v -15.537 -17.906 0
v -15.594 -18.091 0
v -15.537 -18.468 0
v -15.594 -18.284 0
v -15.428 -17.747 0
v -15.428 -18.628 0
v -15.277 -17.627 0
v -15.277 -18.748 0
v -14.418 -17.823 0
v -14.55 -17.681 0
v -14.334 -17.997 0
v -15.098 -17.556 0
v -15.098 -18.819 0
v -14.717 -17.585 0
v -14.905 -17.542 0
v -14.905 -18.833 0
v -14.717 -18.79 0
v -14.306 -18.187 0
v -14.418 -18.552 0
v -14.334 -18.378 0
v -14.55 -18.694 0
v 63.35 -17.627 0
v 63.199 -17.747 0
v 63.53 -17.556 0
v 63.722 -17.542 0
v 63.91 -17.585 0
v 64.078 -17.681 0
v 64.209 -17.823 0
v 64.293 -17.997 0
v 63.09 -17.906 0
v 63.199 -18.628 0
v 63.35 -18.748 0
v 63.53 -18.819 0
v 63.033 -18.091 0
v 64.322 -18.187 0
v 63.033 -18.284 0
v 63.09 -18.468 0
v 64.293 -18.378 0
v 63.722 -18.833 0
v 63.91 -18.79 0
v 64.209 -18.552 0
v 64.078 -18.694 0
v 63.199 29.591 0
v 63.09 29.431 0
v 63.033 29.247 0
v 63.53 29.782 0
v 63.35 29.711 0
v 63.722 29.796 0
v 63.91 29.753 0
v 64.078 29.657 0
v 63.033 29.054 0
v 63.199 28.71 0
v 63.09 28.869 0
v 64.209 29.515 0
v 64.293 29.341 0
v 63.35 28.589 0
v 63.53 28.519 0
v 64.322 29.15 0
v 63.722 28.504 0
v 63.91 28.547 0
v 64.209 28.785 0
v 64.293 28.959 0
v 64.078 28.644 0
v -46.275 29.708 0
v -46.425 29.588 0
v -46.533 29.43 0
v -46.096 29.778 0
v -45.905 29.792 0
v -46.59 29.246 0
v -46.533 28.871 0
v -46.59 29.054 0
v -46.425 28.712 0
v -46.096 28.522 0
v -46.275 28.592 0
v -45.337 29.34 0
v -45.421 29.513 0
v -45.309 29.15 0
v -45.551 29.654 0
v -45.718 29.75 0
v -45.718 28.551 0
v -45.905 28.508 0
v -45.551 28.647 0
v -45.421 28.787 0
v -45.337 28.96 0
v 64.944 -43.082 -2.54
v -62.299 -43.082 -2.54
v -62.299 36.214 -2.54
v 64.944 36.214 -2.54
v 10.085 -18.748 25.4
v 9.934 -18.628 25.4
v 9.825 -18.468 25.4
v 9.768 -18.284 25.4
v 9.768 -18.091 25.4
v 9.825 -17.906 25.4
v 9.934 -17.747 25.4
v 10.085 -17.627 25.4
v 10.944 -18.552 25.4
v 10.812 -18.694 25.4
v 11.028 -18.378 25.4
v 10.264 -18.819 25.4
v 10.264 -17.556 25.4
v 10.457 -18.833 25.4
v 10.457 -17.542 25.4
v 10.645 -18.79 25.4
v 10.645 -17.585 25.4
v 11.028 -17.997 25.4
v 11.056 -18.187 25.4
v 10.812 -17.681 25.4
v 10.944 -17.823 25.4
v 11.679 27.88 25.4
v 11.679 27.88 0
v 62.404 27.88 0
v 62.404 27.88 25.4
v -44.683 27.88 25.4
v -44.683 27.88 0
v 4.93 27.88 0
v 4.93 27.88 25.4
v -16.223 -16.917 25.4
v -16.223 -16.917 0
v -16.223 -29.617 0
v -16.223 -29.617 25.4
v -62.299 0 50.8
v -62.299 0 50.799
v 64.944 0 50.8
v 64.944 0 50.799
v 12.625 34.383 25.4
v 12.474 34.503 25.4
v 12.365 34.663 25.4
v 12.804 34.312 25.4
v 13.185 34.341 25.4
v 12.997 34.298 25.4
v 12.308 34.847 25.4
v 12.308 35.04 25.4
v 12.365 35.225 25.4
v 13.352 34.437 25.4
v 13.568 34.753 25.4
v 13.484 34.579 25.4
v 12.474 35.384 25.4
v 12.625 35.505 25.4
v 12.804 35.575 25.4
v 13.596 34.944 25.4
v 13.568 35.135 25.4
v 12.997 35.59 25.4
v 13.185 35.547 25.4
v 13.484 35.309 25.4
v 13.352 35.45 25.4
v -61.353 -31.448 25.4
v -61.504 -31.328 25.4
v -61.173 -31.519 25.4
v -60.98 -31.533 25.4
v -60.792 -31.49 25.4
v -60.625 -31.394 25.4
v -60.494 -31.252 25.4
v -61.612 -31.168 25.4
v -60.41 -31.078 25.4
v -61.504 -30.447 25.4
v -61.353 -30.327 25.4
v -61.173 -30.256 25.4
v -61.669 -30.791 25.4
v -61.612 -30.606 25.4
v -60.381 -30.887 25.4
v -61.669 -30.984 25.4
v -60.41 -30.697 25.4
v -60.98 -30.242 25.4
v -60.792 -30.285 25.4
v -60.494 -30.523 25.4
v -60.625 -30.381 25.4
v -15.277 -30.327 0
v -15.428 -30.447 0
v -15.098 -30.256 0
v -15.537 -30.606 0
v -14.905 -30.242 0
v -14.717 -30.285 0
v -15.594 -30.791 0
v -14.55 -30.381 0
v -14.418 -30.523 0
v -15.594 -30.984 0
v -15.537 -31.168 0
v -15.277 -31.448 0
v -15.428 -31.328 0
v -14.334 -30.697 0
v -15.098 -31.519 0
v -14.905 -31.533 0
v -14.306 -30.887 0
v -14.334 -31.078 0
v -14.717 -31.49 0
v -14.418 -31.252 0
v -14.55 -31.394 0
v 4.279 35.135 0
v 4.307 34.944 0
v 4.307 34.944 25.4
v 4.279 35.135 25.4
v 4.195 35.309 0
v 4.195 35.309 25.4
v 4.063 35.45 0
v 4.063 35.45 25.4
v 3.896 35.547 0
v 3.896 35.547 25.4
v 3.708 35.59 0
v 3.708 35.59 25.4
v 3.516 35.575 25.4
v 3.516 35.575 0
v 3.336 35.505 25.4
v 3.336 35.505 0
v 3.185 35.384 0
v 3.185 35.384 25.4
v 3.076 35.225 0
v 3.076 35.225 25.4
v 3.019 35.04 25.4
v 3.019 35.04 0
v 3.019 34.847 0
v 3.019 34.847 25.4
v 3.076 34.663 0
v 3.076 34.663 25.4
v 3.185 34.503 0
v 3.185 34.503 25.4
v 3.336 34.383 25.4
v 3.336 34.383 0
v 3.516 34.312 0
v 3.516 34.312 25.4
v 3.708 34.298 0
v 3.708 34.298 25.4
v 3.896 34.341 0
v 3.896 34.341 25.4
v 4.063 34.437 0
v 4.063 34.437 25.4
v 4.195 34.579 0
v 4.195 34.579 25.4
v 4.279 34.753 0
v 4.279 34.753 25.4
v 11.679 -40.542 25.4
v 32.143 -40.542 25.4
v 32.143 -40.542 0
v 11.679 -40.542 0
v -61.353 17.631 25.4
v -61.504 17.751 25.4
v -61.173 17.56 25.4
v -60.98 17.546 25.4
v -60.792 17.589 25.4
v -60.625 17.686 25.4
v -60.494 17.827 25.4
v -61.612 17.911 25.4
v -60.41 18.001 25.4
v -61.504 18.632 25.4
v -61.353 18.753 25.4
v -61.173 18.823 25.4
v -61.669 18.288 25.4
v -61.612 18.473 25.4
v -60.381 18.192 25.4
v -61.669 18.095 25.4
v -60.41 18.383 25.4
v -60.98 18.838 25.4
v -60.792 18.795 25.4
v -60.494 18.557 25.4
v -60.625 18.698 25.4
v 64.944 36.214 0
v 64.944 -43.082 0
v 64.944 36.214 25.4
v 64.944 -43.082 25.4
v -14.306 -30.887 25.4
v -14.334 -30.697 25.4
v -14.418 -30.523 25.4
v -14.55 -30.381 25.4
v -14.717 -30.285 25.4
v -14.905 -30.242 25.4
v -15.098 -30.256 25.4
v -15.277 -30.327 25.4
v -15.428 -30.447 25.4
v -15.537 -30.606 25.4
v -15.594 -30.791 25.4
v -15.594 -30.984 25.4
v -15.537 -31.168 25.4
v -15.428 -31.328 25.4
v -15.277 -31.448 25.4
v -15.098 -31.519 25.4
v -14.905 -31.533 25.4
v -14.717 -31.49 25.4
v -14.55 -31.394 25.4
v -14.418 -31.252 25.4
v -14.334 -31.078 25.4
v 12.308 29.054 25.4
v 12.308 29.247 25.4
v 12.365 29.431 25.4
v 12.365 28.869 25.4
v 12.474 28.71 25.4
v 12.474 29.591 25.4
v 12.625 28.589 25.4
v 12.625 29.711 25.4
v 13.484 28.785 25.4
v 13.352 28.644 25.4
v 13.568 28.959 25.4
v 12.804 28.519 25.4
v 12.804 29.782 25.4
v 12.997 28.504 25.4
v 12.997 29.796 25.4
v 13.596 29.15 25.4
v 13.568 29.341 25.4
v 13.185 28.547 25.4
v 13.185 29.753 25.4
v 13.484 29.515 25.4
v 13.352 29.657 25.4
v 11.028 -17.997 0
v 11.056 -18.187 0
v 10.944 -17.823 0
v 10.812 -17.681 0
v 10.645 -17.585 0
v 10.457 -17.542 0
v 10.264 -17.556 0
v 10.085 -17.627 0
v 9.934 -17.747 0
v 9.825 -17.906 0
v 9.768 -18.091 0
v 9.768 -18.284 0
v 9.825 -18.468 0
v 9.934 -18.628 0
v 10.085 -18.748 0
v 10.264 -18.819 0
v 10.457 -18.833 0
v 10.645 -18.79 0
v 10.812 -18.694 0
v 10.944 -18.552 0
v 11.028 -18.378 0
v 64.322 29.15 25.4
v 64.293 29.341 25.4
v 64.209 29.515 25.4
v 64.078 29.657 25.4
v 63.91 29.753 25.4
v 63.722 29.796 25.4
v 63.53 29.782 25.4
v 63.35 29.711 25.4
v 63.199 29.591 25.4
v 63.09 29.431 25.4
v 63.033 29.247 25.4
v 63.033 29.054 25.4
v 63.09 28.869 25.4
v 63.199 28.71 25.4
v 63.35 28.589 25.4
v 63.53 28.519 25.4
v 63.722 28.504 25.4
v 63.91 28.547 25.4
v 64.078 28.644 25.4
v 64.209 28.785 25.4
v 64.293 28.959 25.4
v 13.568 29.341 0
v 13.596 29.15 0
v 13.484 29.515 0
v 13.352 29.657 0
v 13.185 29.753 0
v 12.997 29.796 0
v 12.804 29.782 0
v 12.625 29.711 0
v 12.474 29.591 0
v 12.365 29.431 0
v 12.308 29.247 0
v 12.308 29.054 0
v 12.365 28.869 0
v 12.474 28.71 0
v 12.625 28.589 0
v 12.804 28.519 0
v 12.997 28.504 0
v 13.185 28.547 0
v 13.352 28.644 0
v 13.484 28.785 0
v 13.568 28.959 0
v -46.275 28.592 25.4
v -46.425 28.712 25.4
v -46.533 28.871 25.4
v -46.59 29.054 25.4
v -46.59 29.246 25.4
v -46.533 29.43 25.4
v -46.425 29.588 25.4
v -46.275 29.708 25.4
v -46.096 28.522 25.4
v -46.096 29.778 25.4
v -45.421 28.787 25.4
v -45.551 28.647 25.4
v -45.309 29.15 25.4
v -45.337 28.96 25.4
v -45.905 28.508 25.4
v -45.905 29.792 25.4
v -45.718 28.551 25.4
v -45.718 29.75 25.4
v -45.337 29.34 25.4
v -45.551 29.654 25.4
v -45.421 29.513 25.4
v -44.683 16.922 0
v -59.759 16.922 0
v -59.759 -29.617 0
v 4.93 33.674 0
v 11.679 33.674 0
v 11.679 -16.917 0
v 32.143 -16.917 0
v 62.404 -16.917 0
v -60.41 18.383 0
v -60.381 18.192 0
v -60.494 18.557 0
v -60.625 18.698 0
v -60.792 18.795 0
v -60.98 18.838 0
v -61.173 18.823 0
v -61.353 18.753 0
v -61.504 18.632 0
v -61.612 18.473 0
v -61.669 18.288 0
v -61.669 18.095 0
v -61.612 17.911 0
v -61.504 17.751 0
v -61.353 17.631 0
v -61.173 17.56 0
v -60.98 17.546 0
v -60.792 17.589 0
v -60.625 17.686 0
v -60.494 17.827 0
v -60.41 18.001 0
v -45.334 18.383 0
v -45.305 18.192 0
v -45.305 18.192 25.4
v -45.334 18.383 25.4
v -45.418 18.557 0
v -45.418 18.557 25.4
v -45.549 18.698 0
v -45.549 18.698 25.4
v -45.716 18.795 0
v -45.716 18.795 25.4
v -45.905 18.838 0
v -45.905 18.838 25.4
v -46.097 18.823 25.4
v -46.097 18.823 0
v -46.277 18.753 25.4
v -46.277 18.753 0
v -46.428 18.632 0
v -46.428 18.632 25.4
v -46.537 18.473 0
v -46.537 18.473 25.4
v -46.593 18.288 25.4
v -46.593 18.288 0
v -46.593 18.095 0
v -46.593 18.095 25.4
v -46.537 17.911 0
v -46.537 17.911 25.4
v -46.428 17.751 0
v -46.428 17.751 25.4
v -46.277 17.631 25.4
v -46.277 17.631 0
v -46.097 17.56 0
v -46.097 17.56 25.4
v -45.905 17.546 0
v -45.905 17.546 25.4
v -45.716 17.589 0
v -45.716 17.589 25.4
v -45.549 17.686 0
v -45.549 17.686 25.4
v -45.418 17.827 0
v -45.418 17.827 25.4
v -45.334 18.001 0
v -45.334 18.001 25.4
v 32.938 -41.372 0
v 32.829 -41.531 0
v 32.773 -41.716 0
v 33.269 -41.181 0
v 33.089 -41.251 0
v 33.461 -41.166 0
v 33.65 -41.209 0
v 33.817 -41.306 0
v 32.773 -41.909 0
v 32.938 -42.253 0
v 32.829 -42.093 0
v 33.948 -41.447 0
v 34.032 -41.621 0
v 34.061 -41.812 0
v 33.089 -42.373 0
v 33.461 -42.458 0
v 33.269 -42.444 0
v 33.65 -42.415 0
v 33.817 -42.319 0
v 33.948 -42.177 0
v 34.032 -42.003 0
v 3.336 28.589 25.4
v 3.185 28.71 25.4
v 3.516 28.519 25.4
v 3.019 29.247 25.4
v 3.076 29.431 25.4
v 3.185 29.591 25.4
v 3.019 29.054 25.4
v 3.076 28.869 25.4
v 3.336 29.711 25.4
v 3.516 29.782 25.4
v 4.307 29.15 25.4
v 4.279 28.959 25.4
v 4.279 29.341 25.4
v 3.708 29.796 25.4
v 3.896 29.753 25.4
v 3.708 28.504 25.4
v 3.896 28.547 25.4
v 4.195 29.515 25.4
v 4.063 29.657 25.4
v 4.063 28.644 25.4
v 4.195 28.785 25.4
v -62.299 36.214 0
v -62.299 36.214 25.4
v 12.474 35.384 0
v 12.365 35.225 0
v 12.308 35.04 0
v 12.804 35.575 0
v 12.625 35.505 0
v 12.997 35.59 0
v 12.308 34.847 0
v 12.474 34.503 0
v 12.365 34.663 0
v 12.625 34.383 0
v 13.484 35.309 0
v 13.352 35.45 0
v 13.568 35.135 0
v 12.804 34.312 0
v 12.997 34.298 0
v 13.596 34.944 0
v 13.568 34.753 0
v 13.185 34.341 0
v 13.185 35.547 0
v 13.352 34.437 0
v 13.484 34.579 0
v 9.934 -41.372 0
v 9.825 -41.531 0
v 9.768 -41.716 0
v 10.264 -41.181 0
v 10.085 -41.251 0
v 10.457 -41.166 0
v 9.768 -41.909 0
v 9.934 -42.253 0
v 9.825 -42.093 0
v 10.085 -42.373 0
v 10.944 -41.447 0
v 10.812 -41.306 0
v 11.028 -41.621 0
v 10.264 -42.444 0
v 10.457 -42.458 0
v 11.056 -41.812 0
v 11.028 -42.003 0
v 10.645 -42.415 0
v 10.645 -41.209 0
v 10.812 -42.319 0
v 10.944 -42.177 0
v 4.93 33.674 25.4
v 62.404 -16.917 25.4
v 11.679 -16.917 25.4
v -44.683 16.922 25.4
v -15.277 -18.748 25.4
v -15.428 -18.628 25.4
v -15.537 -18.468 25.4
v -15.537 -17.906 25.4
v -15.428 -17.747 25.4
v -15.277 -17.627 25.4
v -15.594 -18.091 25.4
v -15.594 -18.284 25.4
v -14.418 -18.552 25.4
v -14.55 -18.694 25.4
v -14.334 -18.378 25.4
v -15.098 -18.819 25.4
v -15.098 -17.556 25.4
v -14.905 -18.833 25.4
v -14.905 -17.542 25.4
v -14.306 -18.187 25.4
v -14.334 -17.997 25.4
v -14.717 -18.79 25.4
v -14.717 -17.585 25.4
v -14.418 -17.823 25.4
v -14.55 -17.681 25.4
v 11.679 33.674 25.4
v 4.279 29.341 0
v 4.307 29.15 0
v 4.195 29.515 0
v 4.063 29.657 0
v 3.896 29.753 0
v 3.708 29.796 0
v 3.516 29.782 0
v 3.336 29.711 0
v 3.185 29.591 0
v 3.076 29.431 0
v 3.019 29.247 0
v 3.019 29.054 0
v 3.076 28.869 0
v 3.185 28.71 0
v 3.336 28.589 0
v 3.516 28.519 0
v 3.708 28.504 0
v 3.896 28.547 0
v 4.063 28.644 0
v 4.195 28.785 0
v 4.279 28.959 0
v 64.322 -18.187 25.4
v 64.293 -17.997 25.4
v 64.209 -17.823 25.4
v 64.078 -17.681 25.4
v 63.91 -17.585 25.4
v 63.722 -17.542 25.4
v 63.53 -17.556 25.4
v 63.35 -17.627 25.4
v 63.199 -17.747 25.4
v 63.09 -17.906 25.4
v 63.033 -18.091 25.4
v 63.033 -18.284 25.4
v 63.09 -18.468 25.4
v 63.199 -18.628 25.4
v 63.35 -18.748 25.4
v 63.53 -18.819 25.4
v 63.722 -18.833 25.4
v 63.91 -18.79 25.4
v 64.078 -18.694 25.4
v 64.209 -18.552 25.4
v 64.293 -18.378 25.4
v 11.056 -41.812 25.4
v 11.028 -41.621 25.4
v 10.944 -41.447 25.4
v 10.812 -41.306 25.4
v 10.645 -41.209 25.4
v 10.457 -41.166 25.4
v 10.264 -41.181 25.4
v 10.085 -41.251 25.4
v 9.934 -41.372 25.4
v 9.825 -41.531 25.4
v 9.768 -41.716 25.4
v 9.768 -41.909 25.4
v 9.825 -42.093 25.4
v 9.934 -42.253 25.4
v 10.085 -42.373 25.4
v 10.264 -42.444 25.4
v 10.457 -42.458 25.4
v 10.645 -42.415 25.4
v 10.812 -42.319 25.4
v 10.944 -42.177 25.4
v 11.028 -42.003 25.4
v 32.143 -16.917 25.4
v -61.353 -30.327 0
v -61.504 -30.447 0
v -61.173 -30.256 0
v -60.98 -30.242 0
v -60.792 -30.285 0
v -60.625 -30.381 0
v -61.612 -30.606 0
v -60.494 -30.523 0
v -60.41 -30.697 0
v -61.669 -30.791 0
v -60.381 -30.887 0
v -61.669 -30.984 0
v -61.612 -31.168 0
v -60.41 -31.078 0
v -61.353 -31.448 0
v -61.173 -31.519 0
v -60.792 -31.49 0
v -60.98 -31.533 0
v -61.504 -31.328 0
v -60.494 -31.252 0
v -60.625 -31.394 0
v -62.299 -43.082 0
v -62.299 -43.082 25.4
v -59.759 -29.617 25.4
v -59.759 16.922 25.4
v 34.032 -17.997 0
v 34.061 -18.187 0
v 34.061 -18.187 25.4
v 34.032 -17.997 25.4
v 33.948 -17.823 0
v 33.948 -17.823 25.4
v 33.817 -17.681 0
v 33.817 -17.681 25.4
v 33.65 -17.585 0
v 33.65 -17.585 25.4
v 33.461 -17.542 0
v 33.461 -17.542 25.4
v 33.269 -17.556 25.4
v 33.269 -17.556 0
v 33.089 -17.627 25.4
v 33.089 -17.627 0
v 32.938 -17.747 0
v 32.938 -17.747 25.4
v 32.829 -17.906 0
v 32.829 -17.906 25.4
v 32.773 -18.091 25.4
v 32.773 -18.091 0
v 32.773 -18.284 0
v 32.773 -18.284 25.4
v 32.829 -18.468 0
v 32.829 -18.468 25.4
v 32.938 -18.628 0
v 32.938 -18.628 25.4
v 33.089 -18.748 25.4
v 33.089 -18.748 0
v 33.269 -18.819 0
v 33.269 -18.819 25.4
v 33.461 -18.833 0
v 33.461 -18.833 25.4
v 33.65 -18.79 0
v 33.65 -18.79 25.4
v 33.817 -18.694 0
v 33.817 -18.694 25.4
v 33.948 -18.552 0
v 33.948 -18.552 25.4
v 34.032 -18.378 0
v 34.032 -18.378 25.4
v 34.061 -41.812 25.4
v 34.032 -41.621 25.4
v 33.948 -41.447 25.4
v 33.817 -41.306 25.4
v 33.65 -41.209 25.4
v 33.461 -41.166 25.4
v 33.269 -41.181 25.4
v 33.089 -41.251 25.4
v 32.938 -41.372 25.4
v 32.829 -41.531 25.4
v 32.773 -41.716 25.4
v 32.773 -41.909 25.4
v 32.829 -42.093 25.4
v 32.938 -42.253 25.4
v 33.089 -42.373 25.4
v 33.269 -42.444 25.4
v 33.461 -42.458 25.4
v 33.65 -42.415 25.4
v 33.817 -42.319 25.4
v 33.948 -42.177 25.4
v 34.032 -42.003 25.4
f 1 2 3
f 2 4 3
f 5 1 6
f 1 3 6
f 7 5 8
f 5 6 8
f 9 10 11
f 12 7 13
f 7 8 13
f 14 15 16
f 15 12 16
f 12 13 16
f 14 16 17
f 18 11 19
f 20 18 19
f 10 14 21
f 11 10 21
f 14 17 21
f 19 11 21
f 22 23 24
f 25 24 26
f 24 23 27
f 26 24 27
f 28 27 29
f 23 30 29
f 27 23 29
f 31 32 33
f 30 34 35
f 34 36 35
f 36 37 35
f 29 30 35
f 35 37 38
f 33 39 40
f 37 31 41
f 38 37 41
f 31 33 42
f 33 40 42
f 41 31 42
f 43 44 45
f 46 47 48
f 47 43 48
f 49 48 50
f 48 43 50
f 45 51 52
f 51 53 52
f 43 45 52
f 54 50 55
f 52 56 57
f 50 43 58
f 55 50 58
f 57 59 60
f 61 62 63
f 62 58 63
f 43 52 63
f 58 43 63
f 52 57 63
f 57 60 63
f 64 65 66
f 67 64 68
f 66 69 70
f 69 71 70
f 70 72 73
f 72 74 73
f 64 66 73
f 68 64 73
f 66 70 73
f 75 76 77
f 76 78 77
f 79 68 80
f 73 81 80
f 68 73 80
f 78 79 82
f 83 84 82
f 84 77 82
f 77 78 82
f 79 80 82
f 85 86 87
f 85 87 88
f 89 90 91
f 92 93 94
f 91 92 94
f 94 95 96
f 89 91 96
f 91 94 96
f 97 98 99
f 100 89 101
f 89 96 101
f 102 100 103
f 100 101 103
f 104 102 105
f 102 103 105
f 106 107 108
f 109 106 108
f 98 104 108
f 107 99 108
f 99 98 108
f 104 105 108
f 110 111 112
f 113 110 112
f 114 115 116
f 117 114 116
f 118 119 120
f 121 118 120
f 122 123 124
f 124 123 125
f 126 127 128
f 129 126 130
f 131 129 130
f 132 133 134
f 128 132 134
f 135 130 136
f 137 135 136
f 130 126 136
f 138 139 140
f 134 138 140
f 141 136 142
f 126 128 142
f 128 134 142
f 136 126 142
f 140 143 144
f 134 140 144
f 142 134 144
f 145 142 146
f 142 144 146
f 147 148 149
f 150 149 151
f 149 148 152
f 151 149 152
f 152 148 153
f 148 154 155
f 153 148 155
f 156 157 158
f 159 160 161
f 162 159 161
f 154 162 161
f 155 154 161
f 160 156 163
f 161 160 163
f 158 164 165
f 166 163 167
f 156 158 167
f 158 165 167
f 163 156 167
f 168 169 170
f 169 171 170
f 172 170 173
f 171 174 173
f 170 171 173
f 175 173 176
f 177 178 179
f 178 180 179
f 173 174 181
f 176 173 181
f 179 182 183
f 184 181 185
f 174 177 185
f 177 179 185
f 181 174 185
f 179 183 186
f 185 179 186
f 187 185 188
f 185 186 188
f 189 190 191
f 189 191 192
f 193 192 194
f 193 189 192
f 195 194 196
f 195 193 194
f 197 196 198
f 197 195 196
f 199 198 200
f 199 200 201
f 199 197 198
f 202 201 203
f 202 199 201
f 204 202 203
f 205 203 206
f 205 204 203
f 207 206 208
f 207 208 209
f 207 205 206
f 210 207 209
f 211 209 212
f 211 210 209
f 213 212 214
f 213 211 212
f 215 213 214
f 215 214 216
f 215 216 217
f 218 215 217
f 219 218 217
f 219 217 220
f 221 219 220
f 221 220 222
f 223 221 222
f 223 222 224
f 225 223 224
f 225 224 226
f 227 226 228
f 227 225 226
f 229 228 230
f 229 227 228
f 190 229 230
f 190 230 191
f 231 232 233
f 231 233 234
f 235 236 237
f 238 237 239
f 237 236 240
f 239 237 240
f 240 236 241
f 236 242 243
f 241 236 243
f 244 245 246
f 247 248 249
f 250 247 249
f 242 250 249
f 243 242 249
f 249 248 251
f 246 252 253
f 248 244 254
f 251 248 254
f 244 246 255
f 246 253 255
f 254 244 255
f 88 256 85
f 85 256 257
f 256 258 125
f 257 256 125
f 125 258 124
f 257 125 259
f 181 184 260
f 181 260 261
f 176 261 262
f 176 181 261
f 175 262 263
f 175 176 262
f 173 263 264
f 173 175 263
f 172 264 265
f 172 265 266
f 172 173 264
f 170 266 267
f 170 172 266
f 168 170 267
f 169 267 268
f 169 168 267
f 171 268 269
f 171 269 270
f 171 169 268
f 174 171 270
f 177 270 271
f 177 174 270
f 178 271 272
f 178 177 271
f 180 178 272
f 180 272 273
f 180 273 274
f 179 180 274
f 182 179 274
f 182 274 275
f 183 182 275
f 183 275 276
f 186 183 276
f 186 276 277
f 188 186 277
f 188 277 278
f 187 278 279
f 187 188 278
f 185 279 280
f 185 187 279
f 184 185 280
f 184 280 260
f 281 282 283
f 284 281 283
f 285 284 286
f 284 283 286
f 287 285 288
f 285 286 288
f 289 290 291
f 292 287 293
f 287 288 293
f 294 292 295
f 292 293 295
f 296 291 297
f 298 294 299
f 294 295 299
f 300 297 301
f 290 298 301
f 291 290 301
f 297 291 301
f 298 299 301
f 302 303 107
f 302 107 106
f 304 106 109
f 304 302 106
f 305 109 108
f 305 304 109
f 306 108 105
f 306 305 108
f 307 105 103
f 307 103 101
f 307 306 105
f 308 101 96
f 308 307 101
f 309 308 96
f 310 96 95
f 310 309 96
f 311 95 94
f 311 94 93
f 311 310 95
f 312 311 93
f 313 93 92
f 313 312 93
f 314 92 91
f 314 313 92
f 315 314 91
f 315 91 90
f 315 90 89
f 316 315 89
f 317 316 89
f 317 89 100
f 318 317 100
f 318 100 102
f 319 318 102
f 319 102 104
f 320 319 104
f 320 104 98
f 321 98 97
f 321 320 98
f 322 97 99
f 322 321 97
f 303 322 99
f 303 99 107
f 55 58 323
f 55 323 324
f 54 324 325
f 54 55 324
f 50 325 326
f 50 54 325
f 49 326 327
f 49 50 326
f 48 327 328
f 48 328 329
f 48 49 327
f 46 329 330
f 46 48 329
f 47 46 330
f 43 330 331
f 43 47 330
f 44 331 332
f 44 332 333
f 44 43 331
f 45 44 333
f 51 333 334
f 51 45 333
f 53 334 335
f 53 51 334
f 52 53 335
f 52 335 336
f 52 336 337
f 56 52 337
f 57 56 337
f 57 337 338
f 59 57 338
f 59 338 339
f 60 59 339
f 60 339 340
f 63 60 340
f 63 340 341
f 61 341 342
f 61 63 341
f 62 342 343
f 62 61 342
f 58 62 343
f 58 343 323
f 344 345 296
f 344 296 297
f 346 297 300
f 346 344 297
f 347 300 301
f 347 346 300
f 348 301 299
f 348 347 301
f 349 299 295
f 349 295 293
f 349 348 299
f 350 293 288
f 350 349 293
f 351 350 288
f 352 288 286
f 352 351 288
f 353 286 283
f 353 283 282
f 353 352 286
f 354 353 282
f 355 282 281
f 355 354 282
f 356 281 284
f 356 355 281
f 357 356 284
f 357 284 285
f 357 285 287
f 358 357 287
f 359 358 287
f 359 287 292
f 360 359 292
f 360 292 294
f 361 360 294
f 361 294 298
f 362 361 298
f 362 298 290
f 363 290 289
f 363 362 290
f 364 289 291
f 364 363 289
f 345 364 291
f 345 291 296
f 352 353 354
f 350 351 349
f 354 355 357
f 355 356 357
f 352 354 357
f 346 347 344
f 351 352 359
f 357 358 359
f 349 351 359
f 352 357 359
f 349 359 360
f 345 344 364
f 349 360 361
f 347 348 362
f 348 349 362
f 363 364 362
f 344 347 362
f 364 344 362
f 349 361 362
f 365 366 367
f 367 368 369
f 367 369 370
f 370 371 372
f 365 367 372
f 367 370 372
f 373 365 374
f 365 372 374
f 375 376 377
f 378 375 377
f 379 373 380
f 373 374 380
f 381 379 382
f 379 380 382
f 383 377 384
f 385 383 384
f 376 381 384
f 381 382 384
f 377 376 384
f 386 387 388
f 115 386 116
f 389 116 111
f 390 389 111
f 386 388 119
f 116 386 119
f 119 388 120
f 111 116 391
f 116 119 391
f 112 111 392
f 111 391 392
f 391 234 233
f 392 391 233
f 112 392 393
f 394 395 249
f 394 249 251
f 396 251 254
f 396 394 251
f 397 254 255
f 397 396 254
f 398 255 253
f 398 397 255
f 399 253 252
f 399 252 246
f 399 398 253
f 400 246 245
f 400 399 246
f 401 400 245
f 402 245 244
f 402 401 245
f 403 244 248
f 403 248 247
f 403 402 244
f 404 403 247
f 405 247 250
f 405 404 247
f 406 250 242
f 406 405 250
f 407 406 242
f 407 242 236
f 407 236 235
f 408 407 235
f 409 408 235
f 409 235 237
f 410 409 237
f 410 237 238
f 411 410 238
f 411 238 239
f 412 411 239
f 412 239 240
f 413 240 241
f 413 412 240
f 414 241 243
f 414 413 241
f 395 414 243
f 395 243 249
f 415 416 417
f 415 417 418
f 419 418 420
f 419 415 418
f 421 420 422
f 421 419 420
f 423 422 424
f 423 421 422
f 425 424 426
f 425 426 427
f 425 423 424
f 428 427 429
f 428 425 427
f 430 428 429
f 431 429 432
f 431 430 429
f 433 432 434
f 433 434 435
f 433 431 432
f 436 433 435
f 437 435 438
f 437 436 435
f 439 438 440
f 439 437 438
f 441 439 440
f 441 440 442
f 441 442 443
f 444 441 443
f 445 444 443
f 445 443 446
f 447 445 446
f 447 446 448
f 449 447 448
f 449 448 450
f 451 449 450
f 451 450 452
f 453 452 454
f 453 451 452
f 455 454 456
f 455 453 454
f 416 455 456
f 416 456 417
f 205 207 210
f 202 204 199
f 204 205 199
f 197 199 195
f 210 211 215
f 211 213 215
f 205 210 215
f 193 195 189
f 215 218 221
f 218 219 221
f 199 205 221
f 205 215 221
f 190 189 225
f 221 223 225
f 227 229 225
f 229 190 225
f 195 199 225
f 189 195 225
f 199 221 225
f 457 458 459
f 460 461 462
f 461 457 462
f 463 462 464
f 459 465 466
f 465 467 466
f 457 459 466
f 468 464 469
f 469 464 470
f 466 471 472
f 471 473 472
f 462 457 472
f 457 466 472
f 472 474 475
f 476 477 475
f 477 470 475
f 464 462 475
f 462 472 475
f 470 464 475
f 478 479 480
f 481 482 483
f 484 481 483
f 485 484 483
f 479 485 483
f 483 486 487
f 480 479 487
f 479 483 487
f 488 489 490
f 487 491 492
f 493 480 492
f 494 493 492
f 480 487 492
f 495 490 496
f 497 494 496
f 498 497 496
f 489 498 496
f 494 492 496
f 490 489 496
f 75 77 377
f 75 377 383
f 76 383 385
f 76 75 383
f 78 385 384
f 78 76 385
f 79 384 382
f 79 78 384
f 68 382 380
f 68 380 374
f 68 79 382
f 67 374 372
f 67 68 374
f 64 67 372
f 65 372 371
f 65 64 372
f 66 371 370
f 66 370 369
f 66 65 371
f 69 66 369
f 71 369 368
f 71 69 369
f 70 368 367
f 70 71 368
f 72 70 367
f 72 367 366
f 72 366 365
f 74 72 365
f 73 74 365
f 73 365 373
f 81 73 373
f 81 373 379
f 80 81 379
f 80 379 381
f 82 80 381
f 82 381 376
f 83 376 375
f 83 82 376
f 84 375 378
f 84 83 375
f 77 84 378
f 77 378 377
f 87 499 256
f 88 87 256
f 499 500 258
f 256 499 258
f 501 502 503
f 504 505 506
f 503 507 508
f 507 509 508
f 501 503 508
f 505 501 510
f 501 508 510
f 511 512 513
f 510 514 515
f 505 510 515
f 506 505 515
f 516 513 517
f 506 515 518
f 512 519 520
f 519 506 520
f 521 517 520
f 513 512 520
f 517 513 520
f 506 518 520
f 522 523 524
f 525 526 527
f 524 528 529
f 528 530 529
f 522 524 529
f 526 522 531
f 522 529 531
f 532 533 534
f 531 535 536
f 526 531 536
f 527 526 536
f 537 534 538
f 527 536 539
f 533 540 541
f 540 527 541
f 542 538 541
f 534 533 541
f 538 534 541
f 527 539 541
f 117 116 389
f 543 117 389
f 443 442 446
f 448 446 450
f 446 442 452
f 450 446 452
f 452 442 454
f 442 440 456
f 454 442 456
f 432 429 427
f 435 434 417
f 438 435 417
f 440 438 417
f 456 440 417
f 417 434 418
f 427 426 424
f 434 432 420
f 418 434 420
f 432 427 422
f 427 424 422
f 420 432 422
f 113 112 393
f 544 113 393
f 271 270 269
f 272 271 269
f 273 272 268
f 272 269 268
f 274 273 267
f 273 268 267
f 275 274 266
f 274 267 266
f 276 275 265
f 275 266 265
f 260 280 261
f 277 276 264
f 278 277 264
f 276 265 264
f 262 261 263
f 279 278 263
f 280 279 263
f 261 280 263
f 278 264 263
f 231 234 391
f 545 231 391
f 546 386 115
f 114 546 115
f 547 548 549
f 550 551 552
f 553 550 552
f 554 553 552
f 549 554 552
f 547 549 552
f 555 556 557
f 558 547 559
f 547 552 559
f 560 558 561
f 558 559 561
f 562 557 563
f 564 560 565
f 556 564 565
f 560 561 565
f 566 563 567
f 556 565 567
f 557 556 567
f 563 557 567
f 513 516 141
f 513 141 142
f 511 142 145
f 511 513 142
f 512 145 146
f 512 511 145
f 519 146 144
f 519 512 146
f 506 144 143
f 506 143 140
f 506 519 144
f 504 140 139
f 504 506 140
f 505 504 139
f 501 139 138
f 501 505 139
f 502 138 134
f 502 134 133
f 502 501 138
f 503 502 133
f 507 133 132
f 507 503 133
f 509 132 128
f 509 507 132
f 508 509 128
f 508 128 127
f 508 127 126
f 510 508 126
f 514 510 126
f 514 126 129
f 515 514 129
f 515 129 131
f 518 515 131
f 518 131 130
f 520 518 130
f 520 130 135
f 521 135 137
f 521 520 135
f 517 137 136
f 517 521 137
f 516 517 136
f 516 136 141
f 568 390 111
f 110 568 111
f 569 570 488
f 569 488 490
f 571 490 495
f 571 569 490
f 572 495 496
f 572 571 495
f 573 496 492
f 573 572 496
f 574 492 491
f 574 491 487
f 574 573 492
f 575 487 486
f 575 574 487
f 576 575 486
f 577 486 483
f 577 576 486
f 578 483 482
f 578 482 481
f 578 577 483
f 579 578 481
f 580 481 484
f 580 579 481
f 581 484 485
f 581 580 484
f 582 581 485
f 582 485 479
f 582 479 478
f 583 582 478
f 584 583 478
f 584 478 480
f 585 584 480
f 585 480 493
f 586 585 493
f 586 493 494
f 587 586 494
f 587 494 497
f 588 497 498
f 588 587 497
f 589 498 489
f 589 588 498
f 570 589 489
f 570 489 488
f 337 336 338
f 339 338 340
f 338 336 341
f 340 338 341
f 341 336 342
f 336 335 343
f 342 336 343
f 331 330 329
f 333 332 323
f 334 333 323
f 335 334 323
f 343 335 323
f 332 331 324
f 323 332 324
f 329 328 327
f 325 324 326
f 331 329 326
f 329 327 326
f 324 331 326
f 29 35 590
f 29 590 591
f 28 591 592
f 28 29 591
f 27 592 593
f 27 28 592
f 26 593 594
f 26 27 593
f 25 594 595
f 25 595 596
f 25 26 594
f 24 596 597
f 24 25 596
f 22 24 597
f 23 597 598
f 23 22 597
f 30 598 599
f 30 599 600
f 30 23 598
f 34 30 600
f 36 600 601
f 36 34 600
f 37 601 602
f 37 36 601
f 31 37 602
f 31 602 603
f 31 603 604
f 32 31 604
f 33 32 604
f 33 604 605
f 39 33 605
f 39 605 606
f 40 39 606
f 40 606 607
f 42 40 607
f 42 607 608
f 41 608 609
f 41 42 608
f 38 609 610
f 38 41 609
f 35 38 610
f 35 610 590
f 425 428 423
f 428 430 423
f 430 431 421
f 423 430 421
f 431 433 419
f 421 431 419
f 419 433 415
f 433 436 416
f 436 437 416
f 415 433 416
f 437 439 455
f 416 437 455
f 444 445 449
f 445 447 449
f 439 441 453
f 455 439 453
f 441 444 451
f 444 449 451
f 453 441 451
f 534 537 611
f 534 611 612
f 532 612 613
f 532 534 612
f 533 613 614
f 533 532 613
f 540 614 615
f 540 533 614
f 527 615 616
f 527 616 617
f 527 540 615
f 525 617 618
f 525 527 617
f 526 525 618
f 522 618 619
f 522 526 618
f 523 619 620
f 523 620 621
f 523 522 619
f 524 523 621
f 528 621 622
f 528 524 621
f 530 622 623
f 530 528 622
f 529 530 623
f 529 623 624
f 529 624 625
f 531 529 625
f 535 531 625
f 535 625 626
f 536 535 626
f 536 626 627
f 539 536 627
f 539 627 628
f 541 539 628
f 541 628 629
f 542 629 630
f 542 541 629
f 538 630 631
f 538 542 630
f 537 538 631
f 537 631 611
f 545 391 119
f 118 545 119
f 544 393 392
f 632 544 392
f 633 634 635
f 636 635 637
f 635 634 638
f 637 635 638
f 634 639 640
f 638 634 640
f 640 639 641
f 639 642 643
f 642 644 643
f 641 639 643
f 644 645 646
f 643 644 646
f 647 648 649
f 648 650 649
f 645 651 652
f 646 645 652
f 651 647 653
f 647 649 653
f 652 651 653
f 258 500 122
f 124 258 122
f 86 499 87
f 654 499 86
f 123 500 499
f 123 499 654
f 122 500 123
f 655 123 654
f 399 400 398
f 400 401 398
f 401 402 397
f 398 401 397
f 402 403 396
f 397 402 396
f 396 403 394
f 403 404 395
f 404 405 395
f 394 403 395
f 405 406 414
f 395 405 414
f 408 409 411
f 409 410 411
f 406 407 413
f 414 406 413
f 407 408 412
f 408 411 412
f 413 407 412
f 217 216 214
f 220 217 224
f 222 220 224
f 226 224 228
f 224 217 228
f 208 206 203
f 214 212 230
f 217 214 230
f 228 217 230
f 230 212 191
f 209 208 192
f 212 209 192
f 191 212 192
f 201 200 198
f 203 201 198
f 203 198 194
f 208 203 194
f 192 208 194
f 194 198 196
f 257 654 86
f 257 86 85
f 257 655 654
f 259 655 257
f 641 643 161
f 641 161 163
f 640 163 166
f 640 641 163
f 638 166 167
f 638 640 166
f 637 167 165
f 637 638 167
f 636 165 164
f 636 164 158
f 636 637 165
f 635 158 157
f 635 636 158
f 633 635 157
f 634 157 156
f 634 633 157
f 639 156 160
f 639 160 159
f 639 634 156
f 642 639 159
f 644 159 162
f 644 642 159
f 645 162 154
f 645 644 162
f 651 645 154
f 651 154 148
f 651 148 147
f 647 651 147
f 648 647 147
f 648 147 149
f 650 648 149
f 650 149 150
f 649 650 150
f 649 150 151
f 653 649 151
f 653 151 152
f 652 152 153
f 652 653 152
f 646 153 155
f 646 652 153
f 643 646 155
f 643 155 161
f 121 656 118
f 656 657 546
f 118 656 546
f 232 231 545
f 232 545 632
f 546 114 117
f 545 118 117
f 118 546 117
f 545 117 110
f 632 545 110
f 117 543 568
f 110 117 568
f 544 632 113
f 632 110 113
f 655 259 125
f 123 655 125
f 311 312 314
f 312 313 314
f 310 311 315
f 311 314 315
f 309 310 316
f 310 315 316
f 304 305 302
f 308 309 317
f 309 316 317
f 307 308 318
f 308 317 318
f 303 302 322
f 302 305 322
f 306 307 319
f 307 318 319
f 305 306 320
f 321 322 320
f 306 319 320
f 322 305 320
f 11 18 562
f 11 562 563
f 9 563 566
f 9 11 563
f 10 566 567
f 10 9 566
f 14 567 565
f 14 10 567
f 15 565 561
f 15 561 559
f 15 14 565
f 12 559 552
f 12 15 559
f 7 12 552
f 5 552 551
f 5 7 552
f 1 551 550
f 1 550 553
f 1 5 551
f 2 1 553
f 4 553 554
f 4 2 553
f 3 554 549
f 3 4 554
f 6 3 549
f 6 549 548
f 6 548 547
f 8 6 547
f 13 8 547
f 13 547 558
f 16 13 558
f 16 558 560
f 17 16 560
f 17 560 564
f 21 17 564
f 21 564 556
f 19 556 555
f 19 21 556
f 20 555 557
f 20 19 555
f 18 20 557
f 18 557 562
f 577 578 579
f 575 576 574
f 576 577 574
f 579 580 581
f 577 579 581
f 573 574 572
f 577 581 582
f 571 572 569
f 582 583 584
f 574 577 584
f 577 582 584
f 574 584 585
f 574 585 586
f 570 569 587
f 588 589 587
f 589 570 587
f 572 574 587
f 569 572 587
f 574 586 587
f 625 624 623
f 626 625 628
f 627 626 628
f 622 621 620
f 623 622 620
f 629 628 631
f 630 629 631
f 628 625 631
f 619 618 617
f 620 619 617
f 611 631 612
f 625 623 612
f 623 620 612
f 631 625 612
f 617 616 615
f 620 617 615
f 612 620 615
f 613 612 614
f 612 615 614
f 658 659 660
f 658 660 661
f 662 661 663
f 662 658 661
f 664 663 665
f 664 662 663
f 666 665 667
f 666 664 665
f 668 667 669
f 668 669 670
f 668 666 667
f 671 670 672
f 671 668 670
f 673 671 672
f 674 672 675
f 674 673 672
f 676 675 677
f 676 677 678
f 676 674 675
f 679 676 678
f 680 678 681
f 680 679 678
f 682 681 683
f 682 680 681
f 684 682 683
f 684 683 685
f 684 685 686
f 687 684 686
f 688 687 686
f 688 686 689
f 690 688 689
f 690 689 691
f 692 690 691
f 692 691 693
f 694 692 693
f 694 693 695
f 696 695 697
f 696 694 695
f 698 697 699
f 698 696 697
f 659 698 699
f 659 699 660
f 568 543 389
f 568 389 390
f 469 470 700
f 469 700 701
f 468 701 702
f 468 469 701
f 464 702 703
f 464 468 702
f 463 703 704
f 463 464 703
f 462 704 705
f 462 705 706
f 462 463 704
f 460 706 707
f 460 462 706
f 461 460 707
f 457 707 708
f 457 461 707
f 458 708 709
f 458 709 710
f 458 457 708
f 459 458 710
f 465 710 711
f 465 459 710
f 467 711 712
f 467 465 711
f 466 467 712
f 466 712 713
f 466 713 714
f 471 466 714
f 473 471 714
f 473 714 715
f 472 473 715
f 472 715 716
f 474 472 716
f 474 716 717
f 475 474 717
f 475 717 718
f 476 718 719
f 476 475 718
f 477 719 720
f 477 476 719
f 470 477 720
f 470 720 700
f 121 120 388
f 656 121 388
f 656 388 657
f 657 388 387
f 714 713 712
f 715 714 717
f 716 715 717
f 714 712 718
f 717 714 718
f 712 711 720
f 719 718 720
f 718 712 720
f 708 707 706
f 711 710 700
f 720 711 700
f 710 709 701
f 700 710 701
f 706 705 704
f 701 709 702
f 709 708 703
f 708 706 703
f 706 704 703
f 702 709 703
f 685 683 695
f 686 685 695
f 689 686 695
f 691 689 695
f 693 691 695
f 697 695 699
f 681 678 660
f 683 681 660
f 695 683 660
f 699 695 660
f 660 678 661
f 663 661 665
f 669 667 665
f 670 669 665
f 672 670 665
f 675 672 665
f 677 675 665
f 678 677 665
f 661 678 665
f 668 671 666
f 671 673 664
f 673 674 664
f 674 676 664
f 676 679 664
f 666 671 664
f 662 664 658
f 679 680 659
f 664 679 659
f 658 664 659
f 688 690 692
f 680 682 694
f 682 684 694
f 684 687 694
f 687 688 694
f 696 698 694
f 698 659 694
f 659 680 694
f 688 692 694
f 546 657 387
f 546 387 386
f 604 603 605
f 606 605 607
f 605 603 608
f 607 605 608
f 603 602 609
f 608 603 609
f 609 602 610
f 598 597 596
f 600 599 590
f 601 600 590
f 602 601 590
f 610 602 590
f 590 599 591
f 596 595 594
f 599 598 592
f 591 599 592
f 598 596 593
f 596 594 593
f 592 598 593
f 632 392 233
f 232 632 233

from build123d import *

# Parameters (mm, degrees)
F0_R      = 0.6477
F0_R_2    = 0.6441405576
F1_DEPTH  = 25.4
F2_W      = 127.2426065671
F2_H      = 43.082173756
F3_DEPTH  = 25.4
F6_DEPTH  = 127.2436065671
F7_W      = 127.2426065671
F7_H      = 36.2138515522
F8_DEPTH  = 25.4
F11_DEPTH = 127.2436065671
F12_W     = 127.2426065671
F12_H     = 79.2960253082
F13_DEPTH = 2.54


# Not quite as in the source:
# - ends of sketch curves that miss each other by under 0.0002 mm in the source are joined


with BuildPart() as f1:
    # F0 (on Top) → F1 (new body)
    with BuildSketch(Plane.XY):
        Polygon((-47.2229928794, 27.8801387091), (-47.2229928794, 30.4201387091), (-44.6829928794, 30.4201387091), (2.3896338216, 30.4201387091), (2.3896338216, 33.6738515522), (2.3896338216, 36.2138515522), (-62.2987892685, 36.2138515522), (-62.2987892685, 19.4619052569), (-59.7587892685, 19.4619052569), (-47.2229928794, 19.4619052569), align=None)
        Polygon((-44.6829928794, 30.4201387091), (-47.2229928794, 30.4201387091), (-47.2229928794, 27.8801387091), (-47.2229928794, 19.4619052569), (-59.7587892685, 19.4619052569), (-62.2987892685, 19.4619052569), (-62.2987892685, 16.9219052569), (-62.2987892685, -29.6174437481), (-62.2987892685, -32.1574437481), (-59.7587892685, -32.1574437481), (-16.2234111885, -32.1574437481), (-13.6834111885, -32.1574437481), (-13.6834111885, -29.6174437481), (-13.6834111885, -19.4574437481), (9.1386072609, -19.4574437481), (9.1386072609, -40.542173756), (9.1386072609, -43.082173756), (11.6786072609, -43.082173756), (32.1430532363, -43.082173756), (34.6830532363, -43.082173756), (34.6830532363, -40.542173756), (34.6830532363, -19.4574437481), (62.4038172987, -19.4574437481), (62.4038172987, -16.9174437481), (34.6830532363, -16.9174437481), (32.1430532363, -16.9174437481), (32.1430532363, -19.4574437481), (32.1430532363, -40.542173756), (11.6786072609, -40.542173756), (11.6786072609, -19.4574437481), (11.6786072609, -16.9174437481), (9.1386072609, -16.9174437481), (-13.6834111885, -16.9174437481), (-16.2234111885, -16.9174437481), (-16.2234111885, -19.4574437481), (-16.2234111885, -29.6174437481), (-59.7587892685, -29.6174437481), (-59.7587892685, 1.3920115222), (-59.7587892685, 2.6620115222), (-59.7587892685, 16.9219052569), (-47.2229928794, 16.9219052569), (-45.9529928794, 16.9219052569), (-44.6829928794, 16.9219052569), (-44.6829928794, 19.4619052569), (-44.6829928794, 27.8801387091), (2.3896338216, 27.8801387091), (4.9296338216, 27.8801387091), (4.9296338216, 30.4201387091), (4.9296338216, 33.6738515522), (11.6786072609, 33.6738515522), (11.6786072609, 30.4201387091), (11.6786072609, 27.8801387091), (14.2186072609, 27.8801387091), (62.4038172987, 27.8801387091), (62.4038172987, 30.4201387091), (14.2186072609, 30.4201387091), (14.2186072609, 33.6738515522), (14.2186072609, 36.2138515522), (11.6786072609, 36.2138515522), (4.9296338216, 36.2138515522), (2.3896338216, 36.2138515522), (2.3896338216, 33.6738515522), (2.3896338216, 30.4201387091), align=None)
        with Locations((-61.0287892685, -30.8874437481)):
            Circle(F0_R, mode=Mode.SUBTRACT)
        with Locations((-14.9534111885, -30.8874437481)):
            Circle(F0_R, mode=Mode.SUBTRACT)
        with Locations((-14.9534111885, -18.1874437481)):
            Circle(F0_R, mode=Mode.SUBTRACT)
        with Locations((10.4086072609, -41.812173756)):
            Circle(F0_R, mode=Mode.SUBTRACT)
        with Locations((33.4130532363, -41.812173756)):
            Circle(F0_R, mode=Mode.SUBTRACT)
        with Locations((10.4086072609, -18.1874437481)):
            Circle(F0_R, mode=Mode.SUBTRACT)
        with Locations((33.4130532363, -18.1874437481)):
            Circle(F0_R, mode=Mode.SUBTRACT)
        with Locations((-61.0287892685, 18.1919052569)):
            Circle(F0_R, mode=Mode.SUBTRACT)
        with Locations((-45.9529928794, 18.1919052569)):
            Circle(F0_R, mode=Mode.SUBTRACT)
        with Locations((-45.9529928794, 29.1501387091)):
            Circle(F0_R_2, mode=Mode.SUBTRACT)
        with Locations((3.6596338216, 29.1501387091)):
            Circle(F0_R, mode=Mode.SUBTRACT)
        with Locations((12.9486072609, 29.1501387091)):
            Circle(F0_R, mode=Mode.SUBTRACT)
        with Locations((3.6596338216, 34.9438515522)):
            Circle(F0_R, mode=Mode.SUBTRACT)
        with Locations((12.9486072609, 34.9438515522)):
            Circle(F0_R, mode=Mode.SUBTRACT)
        Polygon((64.9438172987, 36.2138515522), (14.2186072609, 36.2138515522), (14.2186072609, 33.6738515522), (14.2186072609, 30.4201387091), (62.4038172987, 30.4201387091), (64.9438172987, 30.4201387091), align=None)
        Polygon((-59.7587892685, -32.1574437481), (-62.2987892685, -32.1574437481), (-62.2987892685, -43.082173756), (9.1386072609, -43.082173756), (9.1386072609, -40.542173756), (9.1386072609, -19.4574437481), (-13.6834111885, -19.4574437481), (-13.6834111885, -29.6174437481), (-13.6834111885, -32.1574437481), (-16.2234111885, -32.1574437481), align=None)
        Polygon((64.9438172987, 27.8801387091), (64.9438172987, 30.4201387091), (62.4038172987, 30.4201387091), (62.4038172987, 27.8801387091), (62.4038172987, 2.6620115222), (62.4038172987, 1.3920115222), (62.4038172987, -16.9174437481), (62.4038172987, -19.4574437481), (64.9438172987, -19.4574437481), (64.9438172987, -16.9174437481), align=None)
        with Locations((63.6738172987, -18.1874437481)):
            Circle(F0_R, mode=Mode.SUBTRACT)
        with Locations((63.6738172987, 29.1501387091)):
            Circle(F0_R, mode=Mode.SUBTRACT)
        Polygon((64.9438172987, -43.082173756), (64.9438172987, -19.4574437481), (62.4038172987, -19.4574437481), (34.6830532363, -19.4574437481), (34.6830532363, -40.542173756), (34.6830532363, -43.082173756), align=None)
    extrude(amount=F1_DEPTH)

    # F2 (on face) → F3 (join)
    with BuildSketch(Plane.XY.offset(25.4)):
        with Locations((1.3225140151, -21.541086878)):
            Rectangle(F2_W, F2_H)
    extrude(amount=F3_DEPTH)

    # F5 (on face) → F6 (cut, through all)
    with BuildSketch(Plane.YZ.offset(64.9438172987)):
        Polygon((-43.082173756, 50.8), (-43.082173756, 25.4001487046), (0, 50.7993288338), (0, 50.8), align=None)
    extrude(amount=-F6_DEPTH, mode=Mode.SUBTRACT)

    # F7 (on face) → F8 (join)
    with BuildSketch(Plane.XY.offset(25.4)):
        with Locations((1.3225140151, 18.1069257761)):
            Rectangle(F7_W, F7_H)
    extrude(amount=F8_DEPTH)

    # F9 (on face) → F11 (cut, through all)
    with BuildSketch(Plane(origin=(-62.2987892685, 0, 0), x_dir=(0, -1, 0), z_dir=(-1, 0, 0))):
        Polygon((-36.2138515522, 25.4), (0, 50.7996644169), (0, 50.8), (-36.2138515522, 50.8), align=None)
    extrude(amount=-F11_DEPTH, mode=Mode.SUBTRACT)

    # F12 (on face) → F13 (join)
    with BuildSketch(Plane(origin=(0, 0, 0), x_dir=(1, 0, 0), z_dir=(0, 0, -1))):
        with Locations((1.3225140151, 3.4341611019)):
            Rectangle(F12_W, F12_H)
    extrude(amount=F13_DEPTH)


solid = f1.part
